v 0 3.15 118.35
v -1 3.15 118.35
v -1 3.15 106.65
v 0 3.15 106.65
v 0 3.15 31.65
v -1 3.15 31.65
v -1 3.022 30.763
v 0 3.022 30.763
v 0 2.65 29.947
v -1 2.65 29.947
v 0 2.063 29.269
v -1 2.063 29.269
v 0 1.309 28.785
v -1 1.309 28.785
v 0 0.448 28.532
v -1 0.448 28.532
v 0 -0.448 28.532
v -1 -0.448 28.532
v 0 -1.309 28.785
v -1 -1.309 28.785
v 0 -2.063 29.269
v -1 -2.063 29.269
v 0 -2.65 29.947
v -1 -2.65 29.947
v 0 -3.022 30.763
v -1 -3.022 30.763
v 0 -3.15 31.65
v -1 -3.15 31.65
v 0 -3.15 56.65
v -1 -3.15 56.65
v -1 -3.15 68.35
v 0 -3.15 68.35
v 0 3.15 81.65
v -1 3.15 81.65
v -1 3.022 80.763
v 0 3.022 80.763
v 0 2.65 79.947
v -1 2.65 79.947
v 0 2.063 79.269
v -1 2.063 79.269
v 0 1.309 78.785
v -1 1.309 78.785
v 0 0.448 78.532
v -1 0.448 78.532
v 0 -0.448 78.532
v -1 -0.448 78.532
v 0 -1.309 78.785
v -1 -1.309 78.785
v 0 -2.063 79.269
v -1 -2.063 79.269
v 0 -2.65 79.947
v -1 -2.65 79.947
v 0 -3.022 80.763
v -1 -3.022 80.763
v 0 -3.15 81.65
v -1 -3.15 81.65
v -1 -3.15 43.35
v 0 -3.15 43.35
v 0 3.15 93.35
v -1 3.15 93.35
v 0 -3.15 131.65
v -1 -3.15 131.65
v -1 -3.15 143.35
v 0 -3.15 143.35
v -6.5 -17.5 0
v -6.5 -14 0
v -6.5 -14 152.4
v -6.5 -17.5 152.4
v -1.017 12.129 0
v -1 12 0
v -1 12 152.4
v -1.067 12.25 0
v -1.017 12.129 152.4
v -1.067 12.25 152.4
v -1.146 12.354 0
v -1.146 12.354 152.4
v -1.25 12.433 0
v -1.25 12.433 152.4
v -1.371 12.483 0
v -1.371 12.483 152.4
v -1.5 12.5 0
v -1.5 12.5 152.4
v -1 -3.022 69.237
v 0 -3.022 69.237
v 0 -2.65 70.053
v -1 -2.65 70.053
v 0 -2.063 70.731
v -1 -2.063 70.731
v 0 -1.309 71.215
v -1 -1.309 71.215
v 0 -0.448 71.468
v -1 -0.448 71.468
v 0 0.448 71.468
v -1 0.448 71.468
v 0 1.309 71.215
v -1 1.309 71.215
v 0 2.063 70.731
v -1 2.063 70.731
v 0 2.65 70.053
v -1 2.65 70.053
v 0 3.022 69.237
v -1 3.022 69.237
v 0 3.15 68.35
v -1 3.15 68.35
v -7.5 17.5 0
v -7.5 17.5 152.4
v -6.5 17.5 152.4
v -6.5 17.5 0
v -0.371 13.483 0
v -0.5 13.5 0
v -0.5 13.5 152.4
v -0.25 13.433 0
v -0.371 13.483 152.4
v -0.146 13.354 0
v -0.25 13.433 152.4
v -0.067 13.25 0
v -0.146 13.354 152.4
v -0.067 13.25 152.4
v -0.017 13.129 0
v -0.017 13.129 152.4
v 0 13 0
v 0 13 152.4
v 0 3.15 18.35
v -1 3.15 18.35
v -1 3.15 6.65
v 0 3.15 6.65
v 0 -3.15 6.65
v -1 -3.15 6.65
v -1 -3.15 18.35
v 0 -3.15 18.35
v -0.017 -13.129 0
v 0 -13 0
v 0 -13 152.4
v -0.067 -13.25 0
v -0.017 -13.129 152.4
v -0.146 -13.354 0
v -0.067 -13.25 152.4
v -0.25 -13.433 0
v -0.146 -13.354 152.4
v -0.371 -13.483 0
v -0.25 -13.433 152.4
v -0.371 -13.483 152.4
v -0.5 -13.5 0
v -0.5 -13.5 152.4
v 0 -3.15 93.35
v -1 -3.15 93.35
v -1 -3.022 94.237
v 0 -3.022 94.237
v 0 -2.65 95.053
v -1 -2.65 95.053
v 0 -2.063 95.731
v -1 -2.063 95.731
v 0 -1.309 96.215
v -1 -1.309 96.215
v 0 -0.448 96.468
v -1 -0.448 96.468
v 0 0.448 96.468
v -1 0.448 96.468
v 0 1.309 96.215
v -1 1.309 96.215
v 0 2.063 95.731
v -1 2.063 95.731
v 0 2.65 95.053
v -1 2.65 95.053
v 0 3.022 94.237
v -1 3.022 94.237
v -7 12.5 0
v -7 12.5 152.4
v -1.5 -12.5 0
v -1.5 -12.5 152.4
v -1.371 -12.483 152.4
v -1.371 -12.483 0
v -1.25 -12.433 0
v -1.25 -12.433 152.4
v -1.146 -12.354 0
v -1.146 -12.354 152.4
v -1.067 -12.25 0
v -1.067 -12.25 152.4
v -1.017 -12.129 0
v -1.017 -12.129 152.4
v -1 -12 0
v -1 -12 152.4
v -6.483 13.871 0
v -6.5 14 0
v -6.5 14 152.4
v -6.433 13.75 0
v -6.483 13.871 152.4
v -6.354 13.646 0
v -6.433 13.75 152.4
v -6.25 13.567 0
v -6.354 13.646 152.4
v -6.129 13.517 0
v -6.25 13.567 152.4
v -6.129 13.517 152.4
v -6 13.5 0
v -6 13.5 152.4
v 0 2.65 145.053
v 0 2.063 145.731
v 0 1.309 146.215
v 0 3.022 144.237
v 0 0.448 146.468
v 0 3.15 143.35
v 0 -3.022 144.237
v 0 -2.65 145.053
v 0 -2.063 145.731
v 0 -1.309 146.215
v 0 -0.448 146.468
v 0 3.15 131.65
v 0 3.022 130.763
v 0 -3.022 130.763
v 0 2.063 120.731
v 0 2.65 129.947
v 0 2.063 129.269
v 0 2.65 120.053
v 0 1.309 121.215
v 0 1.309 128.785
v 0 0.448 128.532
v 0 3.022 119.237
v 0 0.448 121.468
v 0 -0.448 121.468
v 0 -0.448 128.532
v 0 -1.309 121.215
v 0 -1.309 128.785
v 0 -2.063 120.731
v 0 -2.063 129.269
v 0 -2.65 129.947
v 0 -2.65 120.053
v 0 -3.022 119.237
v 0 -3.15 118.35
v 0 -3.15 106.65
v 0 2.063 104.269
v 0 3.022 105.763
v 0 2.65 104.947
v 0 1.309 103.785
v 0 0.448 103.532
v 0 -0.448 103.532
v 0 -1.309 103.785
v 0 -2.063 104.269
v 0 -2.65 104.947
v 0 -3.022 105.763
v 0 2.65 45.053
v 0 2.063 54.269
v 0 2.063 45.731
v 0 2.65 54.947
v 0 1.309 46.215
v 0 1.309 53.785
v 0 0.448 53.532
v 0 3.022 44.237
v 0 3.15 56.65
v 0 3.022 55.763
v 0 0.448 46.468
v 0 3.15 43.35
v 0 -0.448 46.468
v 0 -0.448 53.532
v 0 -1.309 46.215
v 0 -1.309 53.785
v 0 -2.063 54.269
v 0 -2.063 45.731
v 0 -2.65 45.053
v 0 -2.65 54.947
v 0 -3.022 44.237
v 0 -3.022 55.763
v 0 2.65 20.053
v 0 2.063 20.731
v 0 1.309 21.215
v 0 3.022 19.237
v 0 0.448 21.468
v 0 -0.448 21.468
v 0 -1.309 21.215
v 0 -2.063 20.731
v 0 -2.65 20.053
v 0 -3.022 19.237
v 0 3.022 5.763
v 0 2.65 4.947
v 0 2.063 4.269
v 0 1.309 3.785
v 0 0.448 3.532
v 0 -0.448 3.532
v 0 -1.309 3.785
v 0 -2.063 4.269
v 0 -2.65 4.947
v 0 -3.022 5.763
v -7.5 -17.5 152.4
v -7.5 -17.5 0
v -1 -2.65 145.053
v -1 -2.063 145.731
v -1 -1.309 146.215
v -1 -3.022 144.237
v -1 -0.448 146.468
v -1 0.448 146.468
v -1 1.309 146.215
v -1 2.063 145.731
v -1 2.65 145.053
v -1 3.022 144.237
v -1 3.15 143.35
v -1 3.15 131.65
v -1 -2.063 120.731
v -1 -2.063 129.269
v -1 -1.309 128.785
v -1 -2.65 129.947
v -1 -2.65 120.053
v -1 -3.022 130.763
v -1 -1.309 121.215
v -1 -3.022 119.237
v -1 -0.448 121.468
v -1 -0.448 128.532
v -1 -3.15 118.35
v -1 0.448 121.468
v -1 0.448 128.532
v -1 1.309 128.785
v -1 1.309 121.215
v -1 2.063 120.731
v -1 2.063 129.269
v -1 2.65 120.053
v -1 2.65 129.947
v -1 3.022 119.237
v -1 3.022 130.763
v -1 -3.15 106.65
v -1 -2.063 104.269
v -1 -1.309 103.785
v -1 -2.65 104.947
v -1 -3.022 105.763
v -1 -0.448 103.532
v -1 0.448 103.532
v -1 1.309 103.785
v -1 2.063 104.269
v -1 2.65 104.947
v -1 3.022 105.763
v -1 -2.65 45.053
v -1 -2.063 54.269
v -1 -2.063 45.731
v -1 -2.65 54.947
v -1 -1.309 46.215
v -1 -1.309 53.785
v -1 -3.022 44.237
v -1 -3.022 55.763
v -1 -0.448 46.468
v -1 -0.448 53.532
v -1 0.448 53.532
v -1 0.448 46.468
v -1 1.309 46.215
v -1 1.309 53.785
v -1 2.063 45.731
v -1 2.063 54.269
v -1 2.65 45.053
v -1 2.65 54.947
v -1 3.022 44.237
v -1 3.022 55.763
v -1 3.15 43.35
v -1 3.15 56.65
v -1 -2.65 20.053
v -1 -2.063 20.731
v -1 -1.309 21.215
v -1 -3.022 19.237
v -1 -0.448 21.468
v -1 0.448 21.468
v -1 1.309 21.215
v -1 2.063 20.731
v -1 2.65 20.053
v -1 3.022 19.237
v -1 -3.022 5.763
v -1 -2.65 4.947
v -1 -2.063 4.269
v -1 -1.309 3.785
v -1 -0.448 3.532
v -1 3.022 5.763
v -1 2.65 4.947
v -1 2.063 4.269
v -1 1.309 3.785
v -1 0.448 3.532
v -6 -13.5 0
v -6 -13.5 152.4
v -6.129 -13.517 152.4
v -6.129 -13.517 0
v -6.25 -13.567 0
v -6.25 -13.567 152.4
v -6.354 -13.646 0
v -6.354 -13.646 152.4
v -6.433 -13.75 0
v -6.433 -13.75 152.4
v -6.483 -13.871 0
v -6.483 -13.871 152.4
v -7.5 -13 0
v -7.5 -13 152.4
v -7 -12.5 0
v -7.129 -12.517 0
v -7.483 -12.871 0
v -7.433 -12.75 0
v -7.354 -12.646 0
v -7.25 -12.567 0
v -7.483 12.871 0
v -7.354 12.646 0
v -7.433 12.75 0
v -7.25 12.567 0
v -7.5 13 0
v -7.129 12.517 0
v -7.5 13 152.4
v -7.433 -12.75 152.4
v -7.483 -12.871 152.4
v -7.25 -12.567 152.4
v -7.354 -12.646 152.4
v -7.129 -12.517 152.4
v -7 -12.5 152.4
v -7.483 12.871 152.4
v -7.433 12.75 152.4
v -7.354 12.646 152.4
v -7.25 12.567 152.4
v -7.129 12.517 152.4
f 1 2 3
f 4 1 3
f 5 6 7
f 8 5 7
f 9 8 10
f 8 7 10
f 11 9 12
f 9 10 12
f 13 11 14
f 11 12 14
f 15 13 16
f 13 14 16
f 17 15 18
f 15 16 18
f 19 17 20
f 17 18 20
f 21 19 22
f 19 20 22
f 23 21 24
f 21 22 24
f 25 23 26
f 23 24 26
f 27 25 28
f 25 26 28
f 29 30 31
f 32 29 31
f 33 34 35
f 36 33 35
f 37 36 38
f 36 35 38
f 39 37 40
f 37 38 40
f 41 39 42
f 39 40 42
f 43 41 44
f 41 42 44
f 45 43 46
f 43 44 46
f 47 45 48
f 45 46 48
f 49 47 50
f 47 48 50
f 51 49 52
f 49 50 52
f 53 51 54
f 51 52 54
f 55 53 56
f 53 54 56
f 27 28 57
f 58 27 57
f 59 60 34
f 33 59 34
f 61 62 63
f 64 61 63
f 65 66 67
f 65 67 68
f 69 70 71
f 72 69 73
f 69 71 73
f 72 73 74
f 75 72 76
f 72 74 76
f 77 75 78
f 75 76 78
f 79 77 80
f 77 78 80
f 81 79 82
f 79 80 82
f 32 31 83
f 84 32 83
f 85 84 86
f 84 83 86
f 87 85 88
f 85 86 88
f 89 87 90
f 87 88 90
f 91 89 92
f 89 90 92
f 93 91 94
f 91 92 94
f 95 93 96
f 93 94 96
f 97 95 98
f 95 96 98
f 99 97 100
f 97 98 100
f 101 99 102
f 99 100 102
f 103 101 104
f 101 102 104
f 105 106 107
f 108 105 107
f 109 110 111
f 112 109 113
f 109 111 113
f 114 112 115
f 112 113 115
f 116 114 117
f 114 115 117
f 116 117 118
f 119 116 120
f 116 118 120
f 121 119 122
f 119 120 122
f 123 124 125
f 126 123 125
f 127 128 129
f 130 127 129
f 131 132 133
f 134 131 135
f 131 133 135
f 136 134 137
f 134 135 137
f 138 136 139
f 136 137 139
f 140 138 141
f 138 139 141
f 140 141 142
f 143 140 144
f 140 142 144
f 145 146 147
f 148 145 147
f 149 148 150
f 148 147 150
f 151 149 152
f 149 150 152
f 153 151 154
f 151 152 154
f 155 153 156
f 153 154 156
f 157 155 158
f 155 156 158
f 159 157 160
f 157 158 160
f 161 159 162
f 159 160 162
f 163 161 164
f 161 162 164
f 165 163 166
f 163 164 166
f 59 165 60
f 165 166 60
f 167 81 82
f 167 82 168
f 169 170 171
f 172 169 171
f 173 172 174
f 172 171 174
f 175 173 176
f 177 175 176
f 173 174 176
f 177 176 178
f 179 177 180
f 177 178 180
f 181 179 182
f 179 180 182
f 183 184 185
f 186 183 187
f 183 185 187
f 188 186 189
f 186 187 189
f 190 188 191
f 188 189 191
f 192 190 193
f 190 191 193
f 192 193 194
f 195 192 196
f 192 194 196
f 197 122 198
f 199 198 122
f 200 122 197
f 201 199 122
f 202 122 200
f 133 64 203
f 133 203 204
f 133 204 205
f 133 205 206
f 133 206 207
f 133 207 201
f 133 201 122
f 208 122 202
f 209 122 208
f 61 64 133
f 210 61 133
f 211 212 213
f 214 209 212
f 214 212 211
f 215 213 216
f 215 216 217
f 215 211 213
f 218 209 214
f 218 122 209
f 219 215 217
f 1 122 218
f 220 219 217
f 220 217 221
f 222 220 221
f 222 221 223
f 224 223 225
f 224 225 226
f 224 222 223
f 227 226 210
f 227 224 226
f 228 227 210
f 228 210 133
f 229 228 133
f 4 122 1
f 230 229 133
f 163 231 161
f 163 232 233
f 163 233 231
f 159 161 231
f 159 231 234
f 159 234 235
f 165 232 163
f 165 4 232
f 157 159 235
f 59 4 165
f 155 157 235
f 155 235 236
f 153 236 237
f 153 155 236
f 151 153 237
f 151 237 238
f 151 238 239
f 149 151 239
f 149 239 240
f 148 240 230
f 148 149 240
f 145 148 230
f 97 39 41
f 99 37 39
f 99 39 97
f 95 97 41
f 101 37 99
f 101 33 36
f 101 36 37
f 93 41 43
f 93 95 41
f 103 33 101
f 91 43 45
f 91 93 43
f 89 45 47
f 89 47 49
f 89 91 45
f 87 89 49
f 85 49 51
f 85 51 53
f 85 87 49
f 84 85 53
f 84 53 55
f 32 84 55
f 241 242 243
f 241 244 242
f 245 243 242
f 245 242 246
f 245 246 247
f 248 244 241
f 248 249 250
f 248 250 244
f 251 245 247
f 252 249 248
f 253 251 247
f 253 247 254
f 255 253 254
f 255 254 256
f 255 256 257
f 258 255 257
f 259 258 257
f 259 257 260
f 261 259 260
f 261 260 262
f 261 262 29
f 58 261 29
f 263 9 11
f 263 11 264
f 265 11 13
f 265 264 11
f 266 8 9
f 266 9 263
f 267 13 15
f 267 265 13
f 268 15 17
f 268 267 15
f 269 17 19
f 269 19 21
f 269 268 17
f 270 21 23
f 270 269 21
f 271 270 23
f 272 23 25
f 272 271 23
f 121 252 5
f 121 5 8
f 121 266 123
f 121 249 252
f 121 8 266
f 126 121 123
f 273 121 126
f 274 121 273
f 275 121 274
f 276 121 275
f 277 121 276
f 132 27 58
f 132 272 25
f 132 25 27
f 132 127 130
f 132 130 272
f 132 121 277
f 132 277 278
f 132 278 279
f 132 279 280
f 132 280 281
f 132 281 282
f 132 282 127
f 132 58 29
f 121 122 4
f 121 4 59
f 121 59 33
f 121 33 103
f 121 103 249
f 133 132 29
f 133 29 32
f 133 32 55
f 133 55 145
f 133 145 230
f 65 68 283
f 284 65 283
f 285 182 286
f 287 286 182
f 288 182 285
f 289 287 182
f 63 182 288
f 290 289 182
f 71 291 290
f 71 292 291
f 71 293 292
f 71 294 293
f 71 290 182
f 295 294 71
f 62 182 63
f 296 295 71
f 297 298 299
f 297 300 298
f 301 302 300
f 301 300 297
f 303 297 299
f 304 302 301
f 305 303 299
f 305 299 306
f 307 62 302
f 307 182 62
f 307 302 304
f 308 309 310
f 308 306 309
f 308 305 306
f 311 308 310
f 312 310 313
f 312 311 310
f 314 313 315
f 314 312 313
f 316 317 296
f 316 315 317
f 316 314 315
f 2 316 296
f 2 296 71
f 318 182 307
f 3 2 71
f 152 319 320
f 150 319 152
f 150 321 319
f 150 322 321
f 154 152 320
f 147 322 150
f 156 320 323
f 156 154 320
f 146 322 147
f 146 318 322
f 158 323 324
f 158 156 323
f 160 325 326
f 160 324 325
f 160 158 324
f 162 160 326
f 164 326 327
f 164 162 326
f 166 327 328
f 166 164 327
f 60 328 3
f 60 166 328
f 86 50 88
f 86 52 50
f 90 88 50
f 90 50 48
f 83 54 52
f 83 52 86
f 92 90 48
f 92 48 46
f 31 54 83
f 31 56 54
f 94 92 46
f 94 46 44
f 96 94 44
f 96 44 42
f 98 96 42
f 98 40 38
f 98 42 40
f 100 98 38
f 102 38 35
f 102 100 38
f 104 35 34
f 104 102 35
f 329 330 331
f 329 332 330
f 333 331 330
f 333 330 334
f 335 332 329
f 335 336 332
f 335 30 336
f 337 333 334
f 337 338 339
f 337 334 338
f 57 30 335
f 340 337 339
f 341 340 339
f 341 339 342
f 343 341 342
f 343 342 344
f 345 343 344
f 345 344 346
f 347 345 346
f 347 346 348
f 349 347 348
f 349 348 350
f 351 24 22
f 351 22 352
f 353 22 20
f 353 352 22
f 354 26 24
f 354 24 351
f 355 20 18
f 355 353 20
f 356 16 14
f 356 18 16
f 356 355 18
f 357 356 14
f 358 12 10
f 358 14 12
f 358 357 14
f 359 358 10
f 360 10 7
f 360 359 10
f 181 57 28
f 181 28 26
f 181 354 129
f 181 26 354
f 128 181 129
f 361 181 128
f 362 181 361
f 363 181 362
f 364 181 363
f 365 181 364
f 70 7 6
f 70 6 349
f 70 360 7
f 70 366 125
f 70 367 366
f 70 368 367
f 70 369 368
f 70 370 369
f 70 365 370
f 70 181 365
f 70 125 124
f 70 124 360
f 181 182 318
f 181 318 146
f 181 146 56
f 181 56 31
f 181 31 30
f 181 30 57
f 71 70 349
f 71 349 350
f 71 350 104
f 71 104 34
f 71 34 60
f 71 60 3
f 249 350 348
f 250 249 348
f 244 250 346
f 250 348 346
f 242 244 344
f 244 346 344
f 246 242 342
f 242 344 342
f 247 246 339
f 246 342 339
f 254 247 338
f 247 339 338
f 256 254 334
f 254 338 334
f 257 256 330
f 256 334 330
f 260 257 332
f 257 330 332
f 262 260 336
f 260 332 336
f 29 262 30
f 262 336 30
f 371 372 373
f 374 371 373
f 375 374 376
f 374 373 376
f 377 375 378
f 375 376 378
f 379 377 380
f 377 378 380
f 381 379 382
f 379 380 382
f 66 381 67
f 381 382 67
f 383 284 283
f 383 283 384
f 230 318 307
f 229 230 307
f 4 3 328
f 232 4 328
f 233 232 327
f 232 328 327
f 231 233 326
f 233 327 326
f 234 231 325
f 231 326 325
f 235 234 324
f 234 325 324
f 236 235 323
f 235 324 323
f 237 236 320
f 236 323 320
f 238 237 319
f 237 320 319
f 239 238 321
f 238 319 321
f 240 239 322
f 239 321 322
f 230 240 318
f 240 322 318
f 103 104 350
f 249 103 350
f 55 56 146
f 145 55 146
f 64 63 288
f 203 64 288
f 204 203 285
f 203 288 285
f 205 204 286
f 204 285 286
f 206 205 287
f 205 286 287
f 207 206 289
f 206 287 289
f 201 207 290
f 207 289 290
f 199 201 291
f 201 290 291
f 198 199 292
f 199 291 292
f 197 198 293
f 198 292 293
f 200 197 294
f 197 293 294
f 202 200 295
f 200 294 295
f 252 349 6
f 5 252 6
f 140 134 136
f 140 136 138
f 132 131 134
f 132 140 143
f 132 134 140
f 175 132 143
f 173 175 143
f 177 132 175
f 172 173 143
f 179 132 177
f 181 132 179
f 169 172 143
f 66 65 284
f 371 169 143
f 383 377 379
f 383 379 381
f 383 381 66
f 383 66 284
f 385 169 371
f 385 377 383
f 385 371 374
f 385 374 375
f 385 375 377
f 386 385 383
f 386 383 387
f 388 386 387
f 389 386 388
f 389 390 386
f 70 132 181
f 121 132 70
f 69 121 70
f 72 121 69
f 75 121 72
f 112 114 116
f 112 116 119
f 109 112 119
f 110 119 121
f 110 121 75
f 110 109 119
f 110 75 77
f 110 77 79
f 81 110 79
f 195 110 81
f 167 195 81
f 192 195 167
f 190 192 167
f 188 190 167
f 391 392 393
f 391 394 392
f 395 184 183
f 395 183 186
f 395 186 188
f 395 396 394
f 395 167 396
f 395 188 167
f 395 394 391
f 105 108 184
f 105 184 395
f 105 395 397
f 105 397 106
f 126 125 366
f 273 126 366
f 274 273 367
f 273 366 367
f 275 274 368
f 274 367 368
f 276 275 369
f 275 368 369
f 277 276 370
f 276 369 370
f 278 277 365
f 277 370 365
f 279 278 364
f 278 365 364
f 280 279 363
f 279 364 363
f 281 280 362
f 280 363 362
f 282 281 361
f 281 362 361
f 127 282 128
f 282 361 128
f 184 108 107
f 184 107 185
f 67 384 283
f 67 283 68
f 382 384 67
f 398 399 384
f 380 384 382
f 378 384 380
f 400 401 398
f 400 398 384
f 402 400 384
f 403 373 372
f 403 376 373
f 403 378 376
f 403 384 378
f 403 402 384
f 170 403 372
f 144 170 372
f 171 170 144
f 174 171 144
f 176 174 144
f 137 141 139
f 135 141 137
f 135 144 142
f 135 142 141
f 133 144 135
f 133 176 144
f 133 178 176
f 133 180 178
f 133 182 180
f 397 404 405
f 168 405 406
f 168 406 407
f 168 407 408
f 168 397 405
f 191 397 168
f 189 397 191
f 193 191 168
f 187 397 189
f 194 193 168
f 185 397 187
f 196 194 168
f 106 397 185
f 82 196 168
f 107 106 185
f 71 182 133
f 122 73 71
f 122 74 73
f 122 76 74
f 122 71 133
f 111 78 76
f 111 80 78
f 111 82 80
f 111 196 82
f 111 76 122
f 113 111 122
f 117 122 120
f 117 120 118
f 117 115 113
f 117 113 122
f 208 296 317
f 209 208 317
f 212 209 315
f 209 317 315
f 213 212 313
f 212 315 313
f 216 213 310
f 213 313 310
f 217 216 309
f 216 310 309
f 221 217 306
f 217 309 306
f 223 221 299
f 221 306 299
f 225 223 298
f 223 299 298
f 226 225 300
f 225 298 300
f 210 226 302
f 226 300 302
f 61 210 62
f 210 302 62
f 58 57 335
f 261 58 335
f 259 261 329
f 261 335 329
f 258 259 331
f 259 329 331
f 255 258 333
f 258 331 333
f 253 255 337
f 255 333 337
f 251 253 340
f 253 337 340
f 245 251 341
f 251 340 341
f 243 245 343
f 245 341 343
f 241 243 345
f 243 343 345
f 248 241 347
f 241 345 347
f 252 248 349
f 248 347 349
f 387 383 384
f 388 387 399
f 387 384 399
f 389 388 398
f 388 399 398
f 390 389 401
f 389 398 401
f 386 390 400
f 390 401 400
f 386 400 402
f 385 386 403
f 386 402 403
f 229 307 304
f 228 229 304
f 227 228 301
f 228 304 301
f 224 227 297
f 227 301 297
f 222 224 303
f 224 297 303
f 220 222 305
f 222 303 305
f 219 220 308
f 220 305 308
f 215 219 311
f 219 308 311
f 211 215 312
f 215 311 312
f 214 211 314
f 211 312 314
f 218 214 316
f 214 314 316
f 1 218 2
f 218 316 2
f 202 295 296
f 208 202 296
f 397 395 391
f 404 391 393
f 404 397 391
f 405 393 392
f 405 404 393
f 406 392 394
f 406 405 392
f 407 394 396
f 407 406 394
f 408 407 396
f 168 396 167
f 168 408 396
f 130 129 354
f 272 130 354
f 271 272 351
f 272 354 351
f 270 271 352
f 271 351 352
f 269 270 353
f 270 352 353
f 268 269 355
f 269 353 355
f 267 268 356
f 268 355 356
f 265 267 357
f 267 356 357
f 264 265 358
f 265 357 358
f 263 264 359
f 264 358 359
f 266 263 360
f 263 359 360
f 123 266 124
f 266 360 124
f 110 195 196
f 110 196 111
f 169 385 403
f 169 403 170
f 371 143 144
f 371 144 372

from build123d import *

# Parameters (mm, degrees)
EXTRUDE_THIN1_DEPTH = 449.2625
CUT_EXTRUDE1_START  = -8.5
CUT_EXTRUDE1_DEPTH  = 9.5
LPATTERN1_COUNT     = 18
LPATTERN1_PITCH     = 25
FILLET1_R           = 0.5
SKETCH5_W           = 23.532863881
SKETCH5_H           = 44.509442227
CUT_EXTRUDE2_DEPTH  = 296.8625


with BuildPart() as part:
    # Sketch3 → Extrude-Thin1 (new body)
    with BuildSketch(Plane.XY):
        Polygon((-6.5, 17.5), (-6.5, 13.5), (0, 13.5), (0, -13.5), (-6.5, -13.5), (-6.5, -17.5), (-7.5, -17.5), (-7.5, -12.5), (-1, -12.5), (-1, 12.5), (-7.5, 12.5), (-7.5, 17.5), align=None)
    extrude(amount=EXTRUDE_THIN1_DEPTH)

    # Sketch4 → Cut-Extrude1 (cut)
    with BuildSketch(Plane(origin=(0, 0, 0), x_dir=(0, 0, -1), z_dir=(1, 0, 0)).offset(CUT_EXTRUDE1_START)):
        with BuildLine():
            Line((-6.65, -3.15), (-18.35, -3.15))
            ThreePointArc((-18.35, -3.15), (-21.5, 0), (-18.35, 3.15))
            Line((-18.35, 3.15), (-6.65, 3.15))
            ThreePointArc((-6.65, 3.15), (-3.5, 0), (-6.65, -3.15))
        make_face()
    cut_extrude1 = extrude(amount=CUT_EXTRUDE1_DEPTH, mode=Mode.SUBTRACT)

    # LPattern1: Cut-Extrude1 ×18
    with Locations(*[(0, 0, i * LPATTERN1_PITCH) for i in range(1, LPATTERN1_COUNT)]):
        add(cut_extrude1, mode=Mode.SUBTRACT)

    # Fillet1
    fillet1_edges = [part.edges().sort_by_distance(p)[0] for p in [
        (-6.5, 13.5, 224.63125),
        (0, 13.5, 224.63125),
        (0, -13.5, 224.63125),
        (-6.5, -13.5, 224.63125),
        (-7.5, -12.5, 224.63125),
        (-1, -12.5, 224.63125),
        (-1, 12.5, 224.63125),
        (-7.5, 12.5, 224.63125),
    ]]
    fillet(fillet1_edges, radius=FILLET1_R)

    # Sketch5 → Cut-Extrude2 (cut)
    with BuildSketch(Plane.XY.offset(449.2625)):
        with Locations((-4.42532449, -0.836961712)):
            Rectangle(SKETCH5_W, SKETCH5_H)
    extrude(amount=-CUT_EXTRUDE2_DEPTH, mode=Mode.SUBTRACT)


solid = part.part
